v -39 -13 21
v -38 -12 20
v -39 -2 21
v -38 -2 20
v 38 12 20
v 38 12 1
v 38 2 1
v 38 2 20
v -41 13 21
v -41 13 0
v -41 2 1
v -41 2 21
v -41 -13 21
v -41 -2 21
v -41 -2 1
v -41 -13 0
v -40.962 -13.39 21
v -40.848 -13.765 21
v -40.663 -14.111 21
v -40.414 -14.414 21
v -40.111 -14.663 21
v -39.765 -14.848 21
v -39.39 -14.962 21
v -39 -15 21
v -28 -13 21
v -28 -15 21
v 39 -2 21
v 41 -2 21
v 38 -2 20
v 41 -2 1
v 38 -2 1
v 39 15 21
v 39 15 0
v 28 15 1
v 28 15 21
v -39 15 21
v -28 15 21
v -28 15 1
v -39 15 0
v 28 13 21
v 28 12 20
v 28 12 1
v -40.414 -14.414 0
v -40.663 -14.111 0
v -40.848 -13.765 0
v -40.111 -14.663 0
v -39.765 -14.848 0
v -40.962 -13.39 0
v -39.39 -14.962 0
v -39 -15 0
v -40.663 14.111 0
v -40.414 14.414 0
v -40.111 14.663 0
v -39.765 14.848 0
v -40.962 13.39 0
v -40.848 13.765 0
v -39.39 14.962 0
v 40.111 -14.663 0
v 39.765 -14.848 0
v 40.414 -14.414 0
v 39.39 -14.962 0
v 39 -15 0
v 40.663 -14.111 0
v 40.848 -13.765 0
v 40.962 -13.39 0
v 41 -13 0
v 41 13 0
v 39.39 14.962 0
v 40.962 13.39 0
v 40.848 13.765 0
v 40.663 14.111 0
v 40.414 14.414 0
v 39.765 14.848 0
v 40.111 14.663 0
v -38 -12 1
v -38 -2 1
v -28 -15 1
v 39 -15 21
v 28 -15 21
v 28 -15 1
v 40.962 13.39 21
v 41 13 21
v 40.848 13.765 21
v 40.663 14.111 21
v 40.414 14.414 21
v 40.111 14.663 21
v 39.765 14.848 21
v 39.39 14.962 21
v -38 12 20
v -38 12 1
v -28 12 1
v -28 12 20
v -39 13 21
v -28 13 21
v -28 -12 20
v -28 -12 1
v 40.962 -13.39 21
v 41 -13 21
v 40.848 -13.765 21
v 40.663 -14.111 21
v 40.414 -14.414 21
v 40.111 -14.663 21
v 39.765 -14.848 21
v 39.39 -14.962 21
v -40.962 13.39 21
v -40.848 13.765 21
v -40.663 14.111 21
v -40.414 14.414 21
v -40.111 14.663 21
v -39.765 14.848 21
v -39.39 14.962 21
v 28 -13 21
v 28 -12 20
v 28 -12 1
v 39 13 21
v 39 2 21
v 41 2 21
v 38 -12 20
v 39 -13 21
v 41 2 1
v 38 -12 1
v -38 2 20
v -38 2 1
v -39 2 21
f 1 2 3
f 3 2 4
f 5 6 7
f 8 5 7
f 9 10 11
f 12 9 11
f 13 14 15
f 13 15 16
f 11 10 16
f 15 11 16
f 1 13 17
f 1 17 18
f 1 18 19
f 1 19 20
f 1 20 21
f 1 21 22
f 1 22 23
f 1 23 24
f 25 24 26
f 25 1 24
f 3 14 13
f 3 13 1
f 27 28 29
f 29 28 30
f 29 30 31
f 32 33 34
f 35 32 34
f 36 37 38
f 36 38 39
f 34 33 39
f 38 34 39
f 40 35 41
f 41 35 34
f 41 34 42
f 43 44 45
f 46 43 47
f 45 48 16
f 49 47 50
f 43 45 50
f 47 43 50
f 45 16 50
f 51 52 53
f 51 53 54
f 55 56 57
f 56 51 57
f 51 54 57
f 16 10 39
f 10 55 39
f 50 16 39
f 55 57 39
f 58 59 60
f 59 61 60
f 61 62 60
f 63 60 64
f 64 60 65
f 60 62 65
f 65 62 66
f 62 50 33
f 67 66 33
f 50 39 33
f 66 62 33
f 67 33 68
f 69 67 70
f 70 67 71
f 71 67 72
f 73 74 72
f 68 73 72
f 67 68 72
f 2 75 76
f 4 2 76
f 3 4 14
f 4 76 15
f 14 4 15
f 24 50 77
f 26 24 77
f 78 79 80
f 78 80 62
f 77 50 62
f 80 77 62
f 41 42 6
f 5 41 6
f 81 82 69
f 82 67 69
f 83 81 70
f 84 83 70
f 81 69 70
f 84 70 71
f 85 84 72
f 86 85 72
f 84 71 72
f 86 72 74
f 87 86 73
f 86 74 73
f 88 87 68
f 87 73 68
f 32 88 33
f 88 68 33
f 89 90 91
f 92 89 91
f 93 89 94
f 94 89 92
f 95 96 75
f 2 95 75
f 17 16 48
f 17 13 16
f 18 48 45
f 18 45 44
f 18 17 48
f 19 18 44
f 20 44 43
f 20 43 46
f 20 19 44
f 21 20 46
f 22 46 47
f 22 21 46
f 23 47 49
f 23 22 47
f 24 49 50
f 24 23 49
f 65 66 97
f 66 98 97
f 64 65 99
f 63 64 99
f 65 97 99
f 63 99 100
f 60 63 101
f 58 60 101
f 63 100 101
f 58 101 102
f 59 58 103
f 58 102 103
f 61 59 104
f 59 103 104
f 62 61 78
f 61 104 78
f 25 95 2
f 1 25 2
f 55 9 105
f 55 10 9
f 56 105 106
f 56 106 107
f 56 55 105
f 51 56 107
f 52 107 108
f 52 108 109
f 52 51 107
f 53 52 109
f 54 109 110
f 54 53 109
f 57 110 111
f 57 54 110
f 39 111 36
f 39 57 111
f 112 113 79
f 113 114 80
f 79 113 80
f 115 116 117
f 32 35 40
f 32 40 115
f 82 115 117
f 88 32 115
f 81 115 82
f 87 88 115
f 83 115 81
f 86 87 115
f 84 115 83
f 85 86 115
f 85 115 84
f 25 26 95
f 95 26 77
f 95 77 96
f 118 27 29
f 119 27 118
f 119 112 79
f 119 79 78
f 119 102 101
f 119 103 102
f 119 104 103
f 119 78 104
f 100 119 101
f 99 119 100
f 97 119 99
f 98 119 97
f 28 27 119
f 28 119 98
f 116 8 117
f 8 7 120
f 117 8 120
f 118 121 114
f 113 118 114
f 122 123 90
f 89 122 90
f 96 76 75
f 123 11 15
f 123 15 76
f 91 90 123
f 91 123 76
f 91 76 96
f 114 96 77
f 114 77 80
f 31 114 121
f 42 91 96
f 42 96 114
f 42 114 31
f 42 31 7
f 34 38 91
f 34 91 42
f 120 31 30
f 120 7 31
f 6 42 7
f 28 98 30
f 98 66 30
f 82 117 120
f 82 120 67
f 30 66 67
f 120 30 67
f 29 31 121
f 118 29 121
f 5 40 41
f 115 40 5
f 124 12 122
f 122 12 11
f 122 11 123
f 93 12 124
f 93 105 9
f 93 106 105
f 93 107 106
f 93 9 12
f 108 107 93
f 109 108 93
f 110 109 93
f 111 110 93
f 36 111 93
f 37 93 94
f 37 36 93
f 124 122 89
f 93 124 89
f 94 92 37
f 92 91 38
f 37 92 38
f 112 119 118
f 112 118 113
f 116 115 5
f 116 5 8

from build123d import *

# Parameters (mm, degrees)
SKETCH_W     = 82
SKETCH_H     = 30
PAD_DEPTH    = 1
PAD001_DEPTH = 20
FILLET_R     = 2
FILLET001_R  = 2
CHAMFER_SIZE = 1


with BuildPart() as part:
    # Sketch → Pad (new body)
    with BuildSketch(Plane.XY):
        Rectangle(SKETCH_W, SKETCH_H)
    extrude(amount=PAD_DEPTH)

    # Sketch001 → Pad001 (new body)
    with BuildSketch(Plane.XY.offset(1)):
        Polygon((-41, 15), (-41, 2), (-38, 2), (-38, 12), (-28, 12), (-28, 15), align=None)
        Polygon((28, -12), (28, -15), (41, -15), (41, -2), (38, -2), (38, -12), align=None)
        Polygon((-41, -2), (-41, -15), (-28, -15), (-28, -12), (-38, -12), (-38, -2), align=None)
        Polygon((38, 2), (41, 2), (41, 15), (28, 15), (28, 12), (38, 12), align=None)
    extrude(amount=PAD001_DEPTH)

    # Fillet
    fillet_edges = [part.edges().sort_by_distance(p)[0] for p in [
        (41, -15, 11),
        (41, 15, 11),
        (-41, 15, 11),
    ]]
    fillet(fillet_edges, radius=FILLET_R)

    # Fillet001
    fillet001_edges = [part.edges().sort_by_distance(p)[0] for p in [
        (-41, -15, 11),
    ]]
    fillet(fillet001_edges, radius=FILLET001_R)

    # Chamfer
    chamfer_edges = [part.edges().sort_by_distance(p)[0] for p in [
        (-38, 7, 21),
        (-33, 12, 21),
        (-38, -7, 21),
        (-33, -12, 21),
        (33, -12, 21),
        (38, -7, 21),
        (38, 7, 21),
        (33, 12, 21),
    ]]
    chamfer(chamfer_edges, length=CHAMFER_SIZE)


solid = part.part
